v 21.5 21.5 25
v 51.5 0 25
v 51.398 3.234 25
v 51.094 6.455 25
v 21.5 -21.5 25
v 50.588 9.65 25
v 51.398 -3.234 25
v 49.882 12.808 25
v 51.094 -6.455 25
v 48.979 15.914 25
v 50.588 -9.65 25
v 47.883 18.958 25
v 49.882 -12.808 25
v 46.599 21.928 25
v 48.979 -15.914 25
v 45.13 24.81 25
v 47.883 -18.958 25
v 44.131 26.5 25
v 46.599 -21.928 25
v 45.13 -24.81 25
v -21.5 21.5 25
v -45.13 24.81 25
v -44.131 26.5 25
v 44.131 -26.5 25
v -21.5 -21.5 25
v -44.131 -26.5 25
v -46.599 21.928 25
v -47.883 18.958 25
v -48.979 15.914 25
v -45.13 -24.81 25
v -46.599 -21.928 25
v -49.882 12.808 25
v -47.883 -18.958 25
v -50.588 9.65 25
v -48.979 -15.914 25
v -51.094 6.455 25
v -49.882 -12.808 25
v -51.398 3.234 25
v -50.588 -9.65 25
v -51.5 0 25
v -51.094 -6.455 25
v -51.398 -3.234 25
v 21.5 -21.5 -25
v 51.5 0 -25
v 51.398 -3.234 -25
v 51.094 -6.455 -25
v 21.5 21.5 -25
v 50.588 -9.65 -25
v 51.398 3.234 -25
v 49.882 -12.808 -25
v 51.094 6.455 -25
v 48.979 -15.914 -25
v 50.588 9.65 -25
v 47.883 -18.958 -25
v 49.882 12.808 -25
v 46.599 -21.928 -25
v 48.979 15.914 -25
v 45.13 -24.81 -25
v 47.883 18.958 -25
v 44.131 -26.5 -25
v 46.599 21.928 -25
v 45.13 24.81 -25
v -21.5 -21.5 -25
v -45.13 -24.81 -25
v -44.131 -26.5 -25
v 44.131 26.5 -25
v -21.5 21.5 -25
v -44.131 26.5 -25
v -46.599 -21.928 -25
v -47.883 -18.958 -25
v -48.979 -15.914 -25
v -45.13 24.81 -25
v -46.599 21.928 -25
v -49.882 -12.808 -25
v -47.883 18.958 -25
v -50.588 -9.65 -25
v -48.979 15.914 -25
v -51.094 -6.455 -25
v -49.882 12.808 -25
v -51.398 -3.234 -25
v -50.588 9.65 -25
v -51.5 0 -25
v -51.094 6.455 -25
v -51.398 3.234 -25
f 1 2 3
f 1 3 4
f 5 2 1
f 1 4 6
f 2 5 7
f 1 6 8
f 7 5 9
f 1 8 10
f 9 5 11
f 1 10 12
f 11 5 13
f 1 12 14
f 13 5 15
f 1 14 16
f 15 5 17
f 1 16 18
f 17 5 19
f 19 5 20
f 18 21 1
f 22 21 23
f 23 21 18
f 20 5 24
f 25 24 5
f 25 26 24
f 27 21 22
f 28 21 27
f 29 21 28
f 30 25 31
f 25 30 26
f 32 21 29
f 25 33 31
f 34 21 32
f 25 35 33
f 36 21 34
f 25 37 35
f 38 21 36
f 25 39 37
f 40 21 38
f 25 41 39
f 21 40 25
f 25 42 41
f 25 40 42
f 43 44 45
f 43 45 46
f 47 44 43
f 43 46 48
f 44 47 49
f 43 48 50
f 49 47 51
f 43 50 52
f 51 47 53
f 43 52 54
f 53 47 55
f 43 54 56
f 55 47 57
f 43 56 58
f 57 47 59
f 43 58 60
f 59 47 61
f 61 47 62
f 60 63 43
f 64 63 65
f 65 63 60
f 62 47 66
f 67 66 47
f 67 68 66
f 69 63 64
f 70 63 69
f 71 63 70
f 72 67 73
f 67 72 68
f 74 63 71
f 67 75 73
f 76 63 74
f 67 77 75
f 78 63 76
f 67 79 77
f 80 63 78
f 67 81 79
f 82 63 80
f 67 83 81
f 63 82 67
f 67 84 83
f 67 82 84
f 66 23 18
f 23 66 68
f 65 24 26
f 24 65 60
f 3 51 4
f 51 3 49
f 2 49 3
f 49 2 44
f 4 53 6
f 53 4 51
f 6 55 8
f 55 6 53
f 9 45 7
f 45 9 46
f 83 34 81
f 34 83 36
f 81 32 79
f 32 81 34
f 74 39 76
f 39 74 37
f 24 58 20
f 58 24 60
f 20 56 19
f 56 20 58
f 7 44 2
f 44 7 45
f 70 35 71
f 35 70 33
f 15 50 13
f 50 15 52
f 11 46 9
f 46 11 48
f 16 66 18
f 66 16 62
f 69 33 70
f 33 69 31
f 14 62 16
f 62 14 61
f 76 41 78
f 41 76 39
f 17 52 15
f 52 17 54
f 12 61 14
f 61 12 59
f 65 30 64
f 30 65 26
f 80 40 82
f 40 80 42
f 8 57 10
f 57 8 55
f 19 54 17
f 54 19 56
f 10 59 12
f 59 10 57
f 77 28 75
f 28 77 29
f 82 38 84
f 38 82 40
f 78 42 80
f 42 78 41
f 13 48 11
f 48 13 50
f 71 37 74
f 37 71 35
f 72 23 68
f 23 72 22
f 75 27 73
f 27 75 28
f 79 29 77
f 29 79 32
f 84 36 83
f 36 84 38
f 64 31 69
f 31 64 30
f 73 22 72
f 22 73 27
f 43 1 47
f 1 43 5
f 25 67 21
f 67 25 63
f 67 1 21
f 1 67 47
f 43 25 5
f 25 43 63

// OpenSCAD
$fn=100;

difference()
{
  intersection(){
    cube(size=[(30*2+43),(5*2+43),50],center=true);
    cylinder(h = 50, d=(30*2+43), center = true);

  }
  cube(size=[43,43,50],center=true);
}
